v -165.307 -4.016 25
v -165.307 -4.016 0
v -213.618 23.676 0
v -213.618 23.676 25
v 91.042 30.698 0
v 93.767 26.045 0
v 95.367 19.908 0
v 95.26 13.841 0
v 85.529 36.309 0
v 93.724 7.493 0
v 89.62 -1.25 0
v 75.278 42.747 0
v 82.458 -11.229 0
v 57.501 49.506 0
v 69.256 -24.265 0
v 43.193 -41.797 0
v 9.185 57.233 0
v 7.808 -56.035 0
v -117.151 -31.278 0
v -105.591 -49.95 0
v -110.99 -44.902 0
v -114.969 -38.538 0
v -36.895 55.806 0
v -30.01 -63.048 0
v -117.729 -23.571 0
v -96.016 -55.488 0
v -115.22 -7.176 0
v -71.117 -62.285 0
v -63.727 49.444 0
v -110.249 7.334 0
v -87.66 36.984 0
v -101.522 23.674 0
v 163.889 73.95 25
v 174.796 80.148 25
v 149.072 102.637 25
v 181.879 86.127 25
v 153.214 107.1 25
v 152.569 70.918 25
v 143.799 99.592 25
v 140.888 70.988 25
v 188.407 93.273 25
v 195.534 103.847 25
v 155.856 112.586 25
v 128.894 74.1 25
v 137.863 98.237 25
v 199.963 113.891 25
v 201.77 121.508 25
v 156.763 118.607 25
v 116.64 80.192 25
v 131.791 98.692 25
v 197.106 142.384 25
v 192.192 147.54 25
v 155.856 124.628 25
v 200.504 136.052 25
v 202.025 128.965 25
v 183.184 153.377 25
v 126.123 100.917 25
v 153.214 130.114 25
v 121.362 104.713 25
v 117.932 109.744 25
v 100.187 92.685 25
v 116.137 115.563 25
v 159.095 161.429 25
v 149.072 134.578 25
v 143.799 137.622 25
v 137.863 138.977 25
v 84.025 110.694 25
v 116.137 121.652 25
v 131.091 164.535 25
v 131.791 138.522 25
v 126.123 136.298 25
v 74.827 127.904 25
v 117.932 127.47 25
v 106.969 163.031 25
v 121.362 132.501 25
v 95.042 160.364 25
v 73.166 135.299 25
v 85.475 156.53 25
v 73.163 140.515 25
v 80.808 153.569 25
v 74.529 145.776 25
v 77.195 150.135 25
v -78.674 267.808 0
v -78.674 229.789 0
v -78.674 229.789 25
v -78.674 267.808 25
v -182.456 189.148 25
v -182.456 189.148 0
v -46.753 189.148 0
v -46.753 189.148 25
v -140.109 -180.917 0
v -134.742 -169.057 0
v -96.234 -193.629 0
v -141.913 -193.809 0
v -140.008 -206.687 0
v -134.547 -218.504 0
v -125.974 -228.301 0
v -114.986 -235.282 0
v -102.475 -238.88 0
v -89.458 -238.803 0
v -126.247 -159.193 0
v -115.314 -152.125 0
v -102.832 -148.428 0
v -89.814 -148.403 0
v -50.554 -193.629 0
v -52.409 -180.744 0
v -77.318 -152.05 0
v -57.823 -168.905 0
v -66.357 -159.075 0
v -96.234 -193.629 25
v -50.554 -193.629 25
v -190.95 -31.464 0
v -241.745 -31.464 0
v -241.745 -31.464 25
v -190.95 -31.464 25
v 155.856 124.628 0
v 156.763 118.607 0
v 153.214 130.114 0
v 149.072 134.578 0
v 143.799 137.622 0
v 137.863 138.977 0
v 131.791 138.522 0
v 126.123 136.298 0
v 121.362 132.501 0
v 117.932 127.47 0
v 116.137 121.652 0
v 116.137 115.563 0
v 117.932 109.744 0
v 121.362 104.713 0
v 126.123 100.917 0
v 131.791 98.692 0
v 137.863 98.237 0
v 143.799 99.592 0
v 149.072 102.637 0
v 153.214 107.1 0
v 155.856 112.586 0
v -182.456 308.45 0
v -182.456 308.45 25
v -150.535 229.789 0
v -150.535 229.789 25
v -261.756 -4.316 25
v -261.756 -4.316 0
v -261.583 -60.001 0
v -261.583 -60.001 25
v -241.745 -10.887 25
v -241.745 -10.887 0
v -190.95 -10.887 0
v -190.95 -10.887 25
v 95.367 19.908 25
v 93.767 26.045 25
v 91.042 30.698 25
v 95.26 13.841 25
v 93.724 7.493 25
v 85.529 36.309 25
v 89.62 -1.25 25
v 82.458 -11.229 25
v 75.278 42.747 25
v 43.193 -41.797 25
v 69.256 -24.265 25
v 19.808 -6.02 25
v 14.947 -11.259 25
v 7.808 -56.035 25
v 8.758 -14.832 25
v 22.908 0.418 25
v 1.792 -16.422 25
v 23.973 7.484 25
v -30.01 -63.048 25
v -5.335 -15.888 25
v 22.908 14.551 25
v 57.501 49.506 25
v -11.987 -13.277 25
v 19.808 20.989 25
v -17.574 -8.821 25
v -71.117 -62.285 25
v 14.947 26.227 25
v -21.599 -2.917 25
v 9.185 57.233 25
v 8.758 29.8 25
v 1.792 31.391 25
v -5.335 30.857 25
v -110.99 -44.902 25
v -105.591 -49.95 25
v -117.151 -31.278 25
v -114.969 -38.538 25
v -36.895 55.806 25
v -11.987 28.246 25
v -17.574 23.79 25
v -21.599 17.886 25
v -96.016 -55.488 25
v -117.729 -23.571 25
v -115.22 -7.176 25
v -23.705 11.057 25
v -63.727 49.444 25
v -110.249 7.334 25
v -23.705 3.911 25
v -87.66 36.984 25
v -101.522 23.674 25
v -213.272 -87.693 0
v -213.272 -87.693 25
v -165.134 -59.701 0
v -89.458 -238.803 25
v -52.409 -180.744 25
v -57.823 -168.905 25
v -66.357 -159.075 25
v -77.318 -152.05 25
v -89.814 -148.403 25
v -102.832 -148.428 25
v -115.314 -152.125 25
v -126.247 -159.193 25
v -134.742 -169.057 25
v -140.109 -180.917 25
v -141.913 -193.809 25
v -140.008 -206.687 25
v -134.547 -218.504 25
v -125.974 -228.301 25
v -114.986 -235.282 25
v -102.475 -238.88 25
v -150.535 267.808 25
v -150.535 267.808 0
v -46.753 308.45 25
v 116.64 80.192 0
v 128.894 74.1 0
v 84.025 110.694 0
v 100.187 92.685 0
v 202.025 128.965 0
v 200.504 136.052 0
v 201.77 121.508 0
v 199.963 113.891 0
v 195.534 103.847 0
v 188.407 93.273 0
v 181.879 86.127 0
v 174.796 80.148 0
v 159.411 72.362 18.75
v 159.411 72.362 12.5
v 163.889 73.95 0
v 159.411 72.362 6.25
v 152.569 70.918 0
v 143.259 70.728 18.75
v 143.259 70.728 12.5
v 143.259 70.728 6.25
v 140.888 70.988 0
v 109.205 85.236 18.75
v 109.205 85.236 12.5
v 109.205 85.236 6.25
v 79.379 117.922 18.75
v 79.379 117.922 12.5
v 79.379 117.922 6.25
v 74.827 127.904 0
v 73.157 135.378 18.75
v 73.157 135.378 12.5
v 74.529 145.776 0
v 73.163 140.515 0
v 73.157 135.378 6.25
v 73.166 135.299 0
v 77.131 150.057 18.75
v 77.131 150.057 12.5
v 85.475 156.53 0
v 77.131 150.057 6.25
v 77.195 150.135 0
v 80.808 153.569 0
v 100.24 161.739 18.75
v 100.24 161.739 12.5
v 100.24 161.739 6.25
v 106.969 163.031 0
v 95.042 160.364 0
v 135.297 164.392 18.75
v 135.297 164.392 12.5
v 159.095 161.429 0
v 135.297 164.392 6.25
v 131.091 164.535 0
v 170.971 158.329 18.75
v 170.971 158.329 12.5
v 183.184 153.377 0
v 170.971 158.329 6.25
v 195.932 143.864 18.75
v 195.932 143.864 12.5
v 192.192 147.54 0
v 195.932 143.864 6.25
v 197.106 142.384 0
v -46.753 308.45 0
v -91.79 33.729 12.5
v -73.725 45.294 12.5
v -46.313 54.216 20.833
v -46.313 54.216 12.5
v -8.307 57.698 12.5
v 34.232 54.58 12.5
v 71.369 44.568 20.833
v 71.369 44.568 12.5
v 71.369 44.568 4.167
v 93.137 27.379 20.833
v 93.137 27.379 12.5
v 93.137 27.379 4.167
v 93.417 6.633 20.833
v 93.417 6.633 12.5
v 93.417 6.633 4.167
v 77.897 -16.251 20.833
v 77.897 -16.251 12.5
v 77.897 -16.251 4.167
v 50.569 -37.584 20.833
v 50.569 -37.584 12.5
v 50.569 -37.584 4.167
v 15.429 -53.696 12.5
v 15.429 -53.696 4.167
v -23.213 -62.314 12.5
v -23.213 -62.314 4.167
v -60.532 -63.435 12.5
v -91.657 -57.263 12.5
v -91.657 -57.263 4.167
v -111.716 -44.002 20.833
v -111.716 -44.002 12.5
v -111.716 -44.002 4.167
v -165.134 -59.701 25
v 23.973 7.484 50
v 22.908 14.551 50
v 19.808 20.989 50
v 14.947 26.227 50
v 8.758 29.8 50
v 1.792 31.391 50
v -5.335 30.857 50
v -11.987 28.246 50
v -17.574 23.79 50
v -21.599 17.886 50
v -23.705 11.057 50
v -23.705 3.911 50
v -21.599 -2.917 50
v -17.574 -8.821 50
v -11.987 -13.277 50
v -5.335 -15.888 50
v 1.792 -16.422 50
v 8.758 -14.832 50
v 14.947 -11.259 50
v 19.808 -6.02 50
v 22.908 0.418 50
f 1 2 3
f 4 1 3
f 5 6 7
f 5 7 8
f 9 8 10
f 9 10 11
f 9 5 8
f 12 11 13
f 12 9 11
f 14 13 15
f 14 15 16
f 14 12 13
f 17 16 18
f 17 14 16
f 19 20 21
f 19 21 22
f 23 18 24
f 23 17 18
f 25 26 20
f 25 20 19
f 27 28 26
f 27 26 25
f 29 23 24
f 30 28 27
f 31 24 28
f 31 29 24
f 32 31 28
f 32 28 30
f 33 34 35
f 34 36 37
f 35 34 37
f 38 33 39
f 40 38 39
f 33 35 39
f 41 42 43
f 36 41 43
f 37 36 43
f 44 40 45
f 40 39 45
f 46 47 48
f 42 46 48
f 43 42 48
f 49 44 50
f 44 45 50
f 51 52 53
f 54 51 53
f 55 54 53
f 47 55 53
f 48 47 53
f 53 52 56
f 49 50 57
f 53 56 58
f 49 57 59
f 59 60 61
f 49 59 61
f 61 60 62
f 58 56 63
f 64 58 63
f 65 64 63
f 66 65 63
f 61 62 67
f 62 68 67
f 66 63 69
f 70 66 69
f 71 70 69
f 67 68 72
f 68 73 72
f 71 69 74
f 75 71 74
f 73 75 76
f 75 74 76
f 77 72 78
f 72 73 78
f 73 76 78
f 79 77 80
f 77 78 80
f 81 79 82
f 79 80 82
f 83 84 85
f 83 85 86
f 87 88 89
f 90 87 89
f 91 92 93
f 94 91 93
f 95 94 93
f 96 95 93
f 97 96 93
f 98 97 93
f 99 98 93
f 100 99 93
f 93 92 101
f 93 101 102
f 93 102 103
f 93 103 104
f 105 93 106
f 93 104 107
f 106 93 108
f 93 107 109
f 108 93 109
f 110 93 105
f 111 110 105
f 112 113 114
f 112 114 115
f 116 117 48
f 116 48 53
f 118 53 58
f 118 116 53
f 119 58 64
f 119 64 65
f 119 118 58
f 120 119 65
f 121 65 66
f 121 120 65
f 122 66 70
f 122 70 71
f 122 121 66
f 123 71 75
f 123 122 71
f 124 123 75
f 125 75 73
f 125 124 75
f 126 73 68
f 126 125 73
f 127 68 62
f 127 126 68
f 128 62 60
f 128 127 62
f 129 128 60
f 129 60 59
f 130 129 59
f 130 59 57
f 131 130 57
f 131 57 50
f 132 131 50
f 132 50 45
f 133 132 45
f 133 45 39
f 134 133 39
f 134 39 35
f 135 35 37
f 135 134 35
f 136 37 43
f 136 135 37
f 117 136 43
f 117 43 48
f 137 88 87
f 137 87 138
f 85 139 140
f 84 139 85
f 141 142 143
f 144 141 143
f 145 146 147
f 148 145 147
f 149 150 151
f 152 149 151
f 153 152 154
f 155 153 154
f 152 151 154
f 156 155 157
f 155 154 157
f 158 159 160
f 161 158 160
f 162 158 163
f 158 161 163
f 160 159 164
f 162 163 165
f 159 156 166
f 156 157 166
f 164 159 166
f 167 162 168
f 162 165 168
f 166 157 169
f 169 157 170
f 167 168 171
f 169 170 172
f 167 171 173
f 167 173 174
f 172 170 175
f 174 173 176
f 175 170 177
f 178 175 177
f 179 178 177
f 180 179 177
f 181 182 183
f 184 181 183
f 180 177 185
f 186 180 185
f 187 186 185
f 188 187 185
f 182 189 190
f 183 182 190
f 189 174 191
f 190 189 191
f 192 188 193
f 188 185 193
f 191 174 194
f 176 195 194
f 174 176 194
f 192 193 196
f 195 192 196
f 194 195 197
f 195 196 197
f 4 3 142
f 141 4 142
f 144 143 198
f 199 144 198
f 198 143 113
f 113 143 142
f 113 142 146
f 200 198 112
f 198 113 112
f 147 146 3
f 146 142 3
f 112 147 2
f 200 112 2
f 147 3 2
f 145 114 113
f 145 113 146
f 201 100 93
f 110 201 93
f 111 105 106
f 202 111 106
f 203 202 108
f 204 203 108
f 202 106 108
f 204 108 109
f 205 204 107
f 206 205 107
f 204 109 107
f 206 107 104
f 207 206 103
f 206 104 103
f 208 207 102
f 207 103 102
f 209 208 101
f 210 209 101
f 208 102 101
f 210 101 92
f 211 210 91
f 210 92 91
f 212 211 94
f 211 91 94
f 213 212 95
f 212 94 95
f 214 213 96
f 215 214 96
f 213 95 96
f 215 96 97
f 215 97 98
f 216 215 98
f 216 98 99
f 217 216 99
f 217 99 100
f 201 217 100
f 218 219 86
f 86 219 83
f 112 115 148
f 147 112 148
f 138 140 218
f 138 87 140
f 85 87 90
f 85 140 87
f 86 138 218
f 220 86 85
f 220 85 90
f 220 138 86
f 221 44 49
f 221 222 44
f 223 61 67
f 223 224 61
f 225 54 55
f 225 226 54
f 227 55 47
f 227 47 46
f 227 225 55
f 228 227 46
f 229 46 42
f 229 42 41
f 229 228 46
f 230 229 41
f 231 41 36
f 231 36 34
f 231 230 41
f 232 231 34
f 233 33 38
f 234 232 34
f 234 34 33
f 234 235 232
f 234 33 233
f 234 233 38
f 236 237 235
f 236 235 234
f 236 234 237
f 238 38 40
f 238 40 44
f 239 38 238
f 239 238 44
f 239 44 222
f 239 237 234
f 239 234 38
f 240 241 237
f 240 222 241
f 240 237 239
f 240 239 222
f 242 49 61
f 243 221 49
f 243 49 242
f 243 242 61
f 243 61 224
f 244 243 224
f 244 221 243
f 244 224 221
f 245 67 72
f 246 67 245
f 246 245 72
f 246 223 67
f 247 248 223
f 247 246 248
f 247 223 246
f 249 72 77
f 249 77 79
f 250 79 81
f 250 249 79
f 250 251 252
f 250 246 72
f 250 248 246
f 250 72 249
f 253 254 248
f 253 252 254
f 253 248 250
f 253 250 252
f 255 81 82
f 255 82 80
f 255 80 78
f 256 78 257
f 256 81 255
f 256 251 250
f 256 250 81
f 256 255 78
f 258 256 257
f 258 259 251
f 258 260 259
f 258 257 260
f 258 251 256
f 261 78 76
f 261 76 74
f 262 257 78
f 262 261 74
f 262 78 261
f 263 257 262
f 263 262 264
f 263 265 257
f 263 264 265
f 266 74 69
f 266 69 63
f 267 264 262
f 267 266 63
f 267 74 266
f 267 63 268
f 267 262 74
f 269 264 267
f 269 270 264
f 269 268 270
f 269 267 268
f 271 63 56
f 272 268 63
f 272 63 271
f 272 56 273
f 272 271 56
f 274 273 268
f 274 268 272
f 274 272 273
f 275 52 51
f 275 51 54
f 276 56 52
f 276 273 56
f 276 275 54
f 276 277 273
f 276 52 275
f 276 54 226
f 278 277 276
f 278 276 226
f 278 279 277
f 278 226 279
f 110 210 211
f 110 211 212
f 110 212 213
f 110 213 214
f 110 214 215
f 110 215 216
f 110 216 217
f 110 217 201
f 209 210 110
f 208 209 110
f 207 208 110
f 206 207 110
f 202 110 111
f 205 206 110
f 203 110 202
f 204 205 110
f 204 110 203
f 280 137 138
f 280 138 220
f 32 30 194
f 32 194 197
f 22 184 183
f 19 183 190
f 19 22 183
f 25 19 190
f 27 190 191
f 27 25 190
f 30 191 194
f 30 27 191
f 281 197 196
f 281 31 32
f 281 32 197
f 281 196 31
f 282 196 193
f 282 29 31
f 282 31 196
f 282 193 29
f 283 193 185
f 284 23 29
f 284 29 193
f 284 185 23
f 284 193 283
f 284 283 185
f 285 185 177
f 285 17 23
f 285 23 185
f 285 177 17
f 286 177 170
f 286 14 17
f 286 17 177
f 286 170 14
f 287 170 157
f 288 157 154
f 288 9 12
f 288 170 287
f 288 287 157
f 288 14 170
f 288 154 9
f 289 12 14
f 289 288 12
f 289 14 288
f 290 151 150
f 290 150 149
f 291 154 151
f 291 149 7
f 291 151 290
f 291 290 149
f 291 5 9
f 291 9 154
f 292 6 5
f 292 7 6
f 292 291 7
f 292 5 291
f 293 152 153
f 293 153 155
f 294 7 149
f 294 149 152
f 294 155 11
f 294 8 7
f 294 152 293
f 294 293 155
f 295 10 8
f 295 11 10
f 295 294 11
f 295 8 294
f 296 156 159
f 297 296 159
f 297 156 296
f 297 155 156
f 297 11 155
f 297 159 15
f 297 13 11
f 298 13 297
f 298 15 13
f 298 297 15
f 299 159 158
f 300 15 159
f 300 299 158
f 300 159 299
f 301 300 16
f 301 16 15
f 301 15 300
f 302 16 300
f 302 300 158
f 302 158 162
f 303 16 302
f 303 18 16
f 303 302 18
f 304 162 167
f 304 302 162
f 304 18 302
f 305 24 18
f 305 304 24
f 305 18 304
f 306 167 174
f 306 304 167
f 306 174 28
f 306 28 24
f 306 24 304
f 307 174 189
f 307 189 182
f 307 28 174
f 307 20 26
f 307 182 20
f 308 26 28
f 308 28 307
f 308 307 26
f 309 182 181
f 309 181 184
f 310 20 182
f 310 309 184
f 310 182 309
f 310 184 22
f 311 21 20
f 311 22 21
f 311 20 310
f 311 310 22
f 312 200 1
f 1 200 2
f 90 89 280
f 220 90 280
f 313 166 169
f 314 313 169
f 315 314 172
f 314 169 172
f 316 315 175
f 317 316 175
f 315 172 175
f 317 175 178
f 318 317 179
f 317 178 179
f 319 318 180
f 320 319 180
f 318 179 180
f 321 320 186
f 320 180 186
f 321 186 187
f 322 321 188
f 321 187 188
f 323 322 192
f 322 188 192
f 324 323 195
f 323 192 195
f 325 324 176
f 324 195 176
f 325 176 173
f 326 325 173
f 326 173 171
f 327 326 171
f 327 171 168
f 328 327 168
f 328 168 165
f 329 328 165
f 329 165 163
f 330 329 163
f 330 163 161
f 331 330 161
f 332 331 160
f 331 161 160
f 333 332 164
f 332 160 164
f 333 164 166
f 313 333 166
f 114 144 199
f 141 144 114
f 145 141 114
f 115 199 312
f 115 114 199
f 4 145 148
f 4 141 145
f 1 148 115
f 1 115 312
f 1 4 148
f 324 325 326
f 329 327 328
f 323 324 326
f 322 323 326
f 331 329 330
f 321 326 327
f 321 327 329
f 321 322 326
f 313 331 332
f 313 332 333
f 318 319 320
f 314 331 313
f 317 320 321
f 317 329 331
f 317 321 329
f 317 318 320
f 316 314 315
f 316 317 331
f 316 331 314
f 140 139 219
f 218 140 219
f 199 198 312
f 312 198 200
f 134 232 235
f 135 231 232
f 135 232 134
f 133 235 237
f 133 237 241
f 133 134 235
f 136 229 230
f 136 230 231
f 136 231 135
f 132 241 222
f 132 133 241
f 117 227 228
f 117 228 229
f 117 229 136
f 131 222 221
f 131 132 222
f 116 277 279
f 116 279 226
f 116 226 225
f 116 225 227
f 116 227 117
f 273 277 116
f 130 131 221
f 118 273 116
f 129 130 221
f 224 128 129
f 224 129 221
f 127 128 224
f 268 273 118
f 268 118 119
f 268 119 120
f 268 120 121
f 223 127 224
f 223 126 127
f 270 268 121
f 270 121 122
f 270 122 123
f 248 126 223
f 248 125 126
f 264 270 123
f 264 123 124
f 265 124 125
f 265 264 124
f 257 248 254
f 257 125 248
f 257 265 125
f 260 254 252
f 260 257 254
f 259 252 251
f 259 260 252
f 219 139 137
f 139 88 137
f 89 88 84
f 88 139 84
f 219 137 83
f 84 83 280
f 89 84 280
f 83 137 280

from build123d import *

# Parameters (mm, degrees)
F1_DEPTH  = 25
F2_R      = 23.9731754404
F3_DEPTH  = 25
F5_DEPTH  = 25
F6_R      = 20.4270765954
F7_DEPTH  = 25
F8_W      = 50.7951080799
F8_H      = 20.5768924206
F9_DEPTH  = 25
F10_W     = 135.7032060623
F10_H     = 119.3020343781
F10_W_2   = 71.8610882759
F10_H_2   = 38.018733263
F11_DEPTH = 25


with BuildPart() as f1:
    # F0 (on Top) → F1 (new body)
    with BuildSketch(Plane.XY):
        with BuildLine():
            add(Edge.make_bspline(
                [(-110.2490648627, 7.3336404748), (-106.1117231408, 17.5186508082), (-97.202158206, 32.4408349692), (-42.9871815198, 68.0023483731), (142.8226087633, 45.8913569282), (32.9649522482, -73.0932355118), (-134.5179263949, -66.4387887819), (-115.999382212, -6.8220772684), (-110.2490648627, 7.3336404748)],
                knots=[0, 0, 0, 0, 0.0959496641, 0.244978234, 0.4600544718, 0.6472860606, 0.8666435951, 1, 1, 1, 1], degree=3))
        make_face()
    extrude(amount=F1_DEPTH)

    # F2 (on face) → F3 (join)
    with BuildSketch(Plane.XY.offset(25)):
        with Locations((0, 7.4844267219)):
            Circle(F2_R)
    extrude(amount=F3_DEPTH)


with BuildPart() as f5:
    # F4 (on Top) → F5 (new body)
    with BuildSketch(Plane.XY):
        with BuildLine():
            Line((-96.233971417, -193.6290711164), (-50.5542549046, -193.6290711164))
            ThreePointArc((-50.5542549046, -193.6290711164), (-130.8473678034, -163.8205271862), (-89.4577052359, -238.8033859125))
            Line((-89.4577052359, -238.8033859125), (-96.233971417, -193.6290711164))
        make_face()
    extrude(amount=F5_DEPTH)


with BuildPart() as f7:
    # F6 (on Top) → F7 (new body)
    with BuildSketch(Plane.XY):
        with BuildLine():
            add(Edge.make_bspline(
                [(174.795627594, 80.1476314664), (155.8799558134, 66.3384798887), (111.4148464519, 69.1988876979), (30.9977828514, 174.3344587626), (234.8391956819, 166.2262265966), (194.4675427033, 94.5088691067), (174.795627594, 80.1476314664)],
                knots=[0, 0, 0, 0, 0.2206268353, 0.4651120876, 0.7705525649, 1, 1, 1, 1], degree=3))
        make_face()
        with Locations((136.3361030817, 118.6071559787)):
            Circle(F6_R, mode=Mode.SUBTRACT)
    extrude(amount=F7_DEPTH)


with BuildPart() as f9:
    # F8 (on Top) → F9 (new body)
    with BuildSketch(Plane.XY):
        Polygon((-213.6183311671, 23.6760866528), (-261.7561290532, -4.3162484353), (-261.5829546987, -60.0009718309), (-213.2719824582, -87.6933601384), (-165.1341845721, -59.7010250504), (-165.3073589266, -4.0163016548), align=None)
        with Locations((-216.3478136063, -21.1757617071)):
            Rectangle(F8_W, F8_H, mode=Mode.SUBTRACT)
    extrude(amount=F9_DEPTH)


with BuildPart() as f11:
    # F10 (on Top) → F11 (new body)
    with BuildSketch(Plane.XY):
        with Locations((-114.6041303873, 248.7987279892)):
            Rectangle(F10_W, F10_H)
        with Locations((-114.6041303873, 248.7987279892)):
            Rectangle(F10_W_2, F10_H_2, mode=Mode.SUBTRACT)
    extrude(amount=F11_DEPTH)


solid = Compound([f1.part, f5.part, f7.part, f9.part, f11.part])
